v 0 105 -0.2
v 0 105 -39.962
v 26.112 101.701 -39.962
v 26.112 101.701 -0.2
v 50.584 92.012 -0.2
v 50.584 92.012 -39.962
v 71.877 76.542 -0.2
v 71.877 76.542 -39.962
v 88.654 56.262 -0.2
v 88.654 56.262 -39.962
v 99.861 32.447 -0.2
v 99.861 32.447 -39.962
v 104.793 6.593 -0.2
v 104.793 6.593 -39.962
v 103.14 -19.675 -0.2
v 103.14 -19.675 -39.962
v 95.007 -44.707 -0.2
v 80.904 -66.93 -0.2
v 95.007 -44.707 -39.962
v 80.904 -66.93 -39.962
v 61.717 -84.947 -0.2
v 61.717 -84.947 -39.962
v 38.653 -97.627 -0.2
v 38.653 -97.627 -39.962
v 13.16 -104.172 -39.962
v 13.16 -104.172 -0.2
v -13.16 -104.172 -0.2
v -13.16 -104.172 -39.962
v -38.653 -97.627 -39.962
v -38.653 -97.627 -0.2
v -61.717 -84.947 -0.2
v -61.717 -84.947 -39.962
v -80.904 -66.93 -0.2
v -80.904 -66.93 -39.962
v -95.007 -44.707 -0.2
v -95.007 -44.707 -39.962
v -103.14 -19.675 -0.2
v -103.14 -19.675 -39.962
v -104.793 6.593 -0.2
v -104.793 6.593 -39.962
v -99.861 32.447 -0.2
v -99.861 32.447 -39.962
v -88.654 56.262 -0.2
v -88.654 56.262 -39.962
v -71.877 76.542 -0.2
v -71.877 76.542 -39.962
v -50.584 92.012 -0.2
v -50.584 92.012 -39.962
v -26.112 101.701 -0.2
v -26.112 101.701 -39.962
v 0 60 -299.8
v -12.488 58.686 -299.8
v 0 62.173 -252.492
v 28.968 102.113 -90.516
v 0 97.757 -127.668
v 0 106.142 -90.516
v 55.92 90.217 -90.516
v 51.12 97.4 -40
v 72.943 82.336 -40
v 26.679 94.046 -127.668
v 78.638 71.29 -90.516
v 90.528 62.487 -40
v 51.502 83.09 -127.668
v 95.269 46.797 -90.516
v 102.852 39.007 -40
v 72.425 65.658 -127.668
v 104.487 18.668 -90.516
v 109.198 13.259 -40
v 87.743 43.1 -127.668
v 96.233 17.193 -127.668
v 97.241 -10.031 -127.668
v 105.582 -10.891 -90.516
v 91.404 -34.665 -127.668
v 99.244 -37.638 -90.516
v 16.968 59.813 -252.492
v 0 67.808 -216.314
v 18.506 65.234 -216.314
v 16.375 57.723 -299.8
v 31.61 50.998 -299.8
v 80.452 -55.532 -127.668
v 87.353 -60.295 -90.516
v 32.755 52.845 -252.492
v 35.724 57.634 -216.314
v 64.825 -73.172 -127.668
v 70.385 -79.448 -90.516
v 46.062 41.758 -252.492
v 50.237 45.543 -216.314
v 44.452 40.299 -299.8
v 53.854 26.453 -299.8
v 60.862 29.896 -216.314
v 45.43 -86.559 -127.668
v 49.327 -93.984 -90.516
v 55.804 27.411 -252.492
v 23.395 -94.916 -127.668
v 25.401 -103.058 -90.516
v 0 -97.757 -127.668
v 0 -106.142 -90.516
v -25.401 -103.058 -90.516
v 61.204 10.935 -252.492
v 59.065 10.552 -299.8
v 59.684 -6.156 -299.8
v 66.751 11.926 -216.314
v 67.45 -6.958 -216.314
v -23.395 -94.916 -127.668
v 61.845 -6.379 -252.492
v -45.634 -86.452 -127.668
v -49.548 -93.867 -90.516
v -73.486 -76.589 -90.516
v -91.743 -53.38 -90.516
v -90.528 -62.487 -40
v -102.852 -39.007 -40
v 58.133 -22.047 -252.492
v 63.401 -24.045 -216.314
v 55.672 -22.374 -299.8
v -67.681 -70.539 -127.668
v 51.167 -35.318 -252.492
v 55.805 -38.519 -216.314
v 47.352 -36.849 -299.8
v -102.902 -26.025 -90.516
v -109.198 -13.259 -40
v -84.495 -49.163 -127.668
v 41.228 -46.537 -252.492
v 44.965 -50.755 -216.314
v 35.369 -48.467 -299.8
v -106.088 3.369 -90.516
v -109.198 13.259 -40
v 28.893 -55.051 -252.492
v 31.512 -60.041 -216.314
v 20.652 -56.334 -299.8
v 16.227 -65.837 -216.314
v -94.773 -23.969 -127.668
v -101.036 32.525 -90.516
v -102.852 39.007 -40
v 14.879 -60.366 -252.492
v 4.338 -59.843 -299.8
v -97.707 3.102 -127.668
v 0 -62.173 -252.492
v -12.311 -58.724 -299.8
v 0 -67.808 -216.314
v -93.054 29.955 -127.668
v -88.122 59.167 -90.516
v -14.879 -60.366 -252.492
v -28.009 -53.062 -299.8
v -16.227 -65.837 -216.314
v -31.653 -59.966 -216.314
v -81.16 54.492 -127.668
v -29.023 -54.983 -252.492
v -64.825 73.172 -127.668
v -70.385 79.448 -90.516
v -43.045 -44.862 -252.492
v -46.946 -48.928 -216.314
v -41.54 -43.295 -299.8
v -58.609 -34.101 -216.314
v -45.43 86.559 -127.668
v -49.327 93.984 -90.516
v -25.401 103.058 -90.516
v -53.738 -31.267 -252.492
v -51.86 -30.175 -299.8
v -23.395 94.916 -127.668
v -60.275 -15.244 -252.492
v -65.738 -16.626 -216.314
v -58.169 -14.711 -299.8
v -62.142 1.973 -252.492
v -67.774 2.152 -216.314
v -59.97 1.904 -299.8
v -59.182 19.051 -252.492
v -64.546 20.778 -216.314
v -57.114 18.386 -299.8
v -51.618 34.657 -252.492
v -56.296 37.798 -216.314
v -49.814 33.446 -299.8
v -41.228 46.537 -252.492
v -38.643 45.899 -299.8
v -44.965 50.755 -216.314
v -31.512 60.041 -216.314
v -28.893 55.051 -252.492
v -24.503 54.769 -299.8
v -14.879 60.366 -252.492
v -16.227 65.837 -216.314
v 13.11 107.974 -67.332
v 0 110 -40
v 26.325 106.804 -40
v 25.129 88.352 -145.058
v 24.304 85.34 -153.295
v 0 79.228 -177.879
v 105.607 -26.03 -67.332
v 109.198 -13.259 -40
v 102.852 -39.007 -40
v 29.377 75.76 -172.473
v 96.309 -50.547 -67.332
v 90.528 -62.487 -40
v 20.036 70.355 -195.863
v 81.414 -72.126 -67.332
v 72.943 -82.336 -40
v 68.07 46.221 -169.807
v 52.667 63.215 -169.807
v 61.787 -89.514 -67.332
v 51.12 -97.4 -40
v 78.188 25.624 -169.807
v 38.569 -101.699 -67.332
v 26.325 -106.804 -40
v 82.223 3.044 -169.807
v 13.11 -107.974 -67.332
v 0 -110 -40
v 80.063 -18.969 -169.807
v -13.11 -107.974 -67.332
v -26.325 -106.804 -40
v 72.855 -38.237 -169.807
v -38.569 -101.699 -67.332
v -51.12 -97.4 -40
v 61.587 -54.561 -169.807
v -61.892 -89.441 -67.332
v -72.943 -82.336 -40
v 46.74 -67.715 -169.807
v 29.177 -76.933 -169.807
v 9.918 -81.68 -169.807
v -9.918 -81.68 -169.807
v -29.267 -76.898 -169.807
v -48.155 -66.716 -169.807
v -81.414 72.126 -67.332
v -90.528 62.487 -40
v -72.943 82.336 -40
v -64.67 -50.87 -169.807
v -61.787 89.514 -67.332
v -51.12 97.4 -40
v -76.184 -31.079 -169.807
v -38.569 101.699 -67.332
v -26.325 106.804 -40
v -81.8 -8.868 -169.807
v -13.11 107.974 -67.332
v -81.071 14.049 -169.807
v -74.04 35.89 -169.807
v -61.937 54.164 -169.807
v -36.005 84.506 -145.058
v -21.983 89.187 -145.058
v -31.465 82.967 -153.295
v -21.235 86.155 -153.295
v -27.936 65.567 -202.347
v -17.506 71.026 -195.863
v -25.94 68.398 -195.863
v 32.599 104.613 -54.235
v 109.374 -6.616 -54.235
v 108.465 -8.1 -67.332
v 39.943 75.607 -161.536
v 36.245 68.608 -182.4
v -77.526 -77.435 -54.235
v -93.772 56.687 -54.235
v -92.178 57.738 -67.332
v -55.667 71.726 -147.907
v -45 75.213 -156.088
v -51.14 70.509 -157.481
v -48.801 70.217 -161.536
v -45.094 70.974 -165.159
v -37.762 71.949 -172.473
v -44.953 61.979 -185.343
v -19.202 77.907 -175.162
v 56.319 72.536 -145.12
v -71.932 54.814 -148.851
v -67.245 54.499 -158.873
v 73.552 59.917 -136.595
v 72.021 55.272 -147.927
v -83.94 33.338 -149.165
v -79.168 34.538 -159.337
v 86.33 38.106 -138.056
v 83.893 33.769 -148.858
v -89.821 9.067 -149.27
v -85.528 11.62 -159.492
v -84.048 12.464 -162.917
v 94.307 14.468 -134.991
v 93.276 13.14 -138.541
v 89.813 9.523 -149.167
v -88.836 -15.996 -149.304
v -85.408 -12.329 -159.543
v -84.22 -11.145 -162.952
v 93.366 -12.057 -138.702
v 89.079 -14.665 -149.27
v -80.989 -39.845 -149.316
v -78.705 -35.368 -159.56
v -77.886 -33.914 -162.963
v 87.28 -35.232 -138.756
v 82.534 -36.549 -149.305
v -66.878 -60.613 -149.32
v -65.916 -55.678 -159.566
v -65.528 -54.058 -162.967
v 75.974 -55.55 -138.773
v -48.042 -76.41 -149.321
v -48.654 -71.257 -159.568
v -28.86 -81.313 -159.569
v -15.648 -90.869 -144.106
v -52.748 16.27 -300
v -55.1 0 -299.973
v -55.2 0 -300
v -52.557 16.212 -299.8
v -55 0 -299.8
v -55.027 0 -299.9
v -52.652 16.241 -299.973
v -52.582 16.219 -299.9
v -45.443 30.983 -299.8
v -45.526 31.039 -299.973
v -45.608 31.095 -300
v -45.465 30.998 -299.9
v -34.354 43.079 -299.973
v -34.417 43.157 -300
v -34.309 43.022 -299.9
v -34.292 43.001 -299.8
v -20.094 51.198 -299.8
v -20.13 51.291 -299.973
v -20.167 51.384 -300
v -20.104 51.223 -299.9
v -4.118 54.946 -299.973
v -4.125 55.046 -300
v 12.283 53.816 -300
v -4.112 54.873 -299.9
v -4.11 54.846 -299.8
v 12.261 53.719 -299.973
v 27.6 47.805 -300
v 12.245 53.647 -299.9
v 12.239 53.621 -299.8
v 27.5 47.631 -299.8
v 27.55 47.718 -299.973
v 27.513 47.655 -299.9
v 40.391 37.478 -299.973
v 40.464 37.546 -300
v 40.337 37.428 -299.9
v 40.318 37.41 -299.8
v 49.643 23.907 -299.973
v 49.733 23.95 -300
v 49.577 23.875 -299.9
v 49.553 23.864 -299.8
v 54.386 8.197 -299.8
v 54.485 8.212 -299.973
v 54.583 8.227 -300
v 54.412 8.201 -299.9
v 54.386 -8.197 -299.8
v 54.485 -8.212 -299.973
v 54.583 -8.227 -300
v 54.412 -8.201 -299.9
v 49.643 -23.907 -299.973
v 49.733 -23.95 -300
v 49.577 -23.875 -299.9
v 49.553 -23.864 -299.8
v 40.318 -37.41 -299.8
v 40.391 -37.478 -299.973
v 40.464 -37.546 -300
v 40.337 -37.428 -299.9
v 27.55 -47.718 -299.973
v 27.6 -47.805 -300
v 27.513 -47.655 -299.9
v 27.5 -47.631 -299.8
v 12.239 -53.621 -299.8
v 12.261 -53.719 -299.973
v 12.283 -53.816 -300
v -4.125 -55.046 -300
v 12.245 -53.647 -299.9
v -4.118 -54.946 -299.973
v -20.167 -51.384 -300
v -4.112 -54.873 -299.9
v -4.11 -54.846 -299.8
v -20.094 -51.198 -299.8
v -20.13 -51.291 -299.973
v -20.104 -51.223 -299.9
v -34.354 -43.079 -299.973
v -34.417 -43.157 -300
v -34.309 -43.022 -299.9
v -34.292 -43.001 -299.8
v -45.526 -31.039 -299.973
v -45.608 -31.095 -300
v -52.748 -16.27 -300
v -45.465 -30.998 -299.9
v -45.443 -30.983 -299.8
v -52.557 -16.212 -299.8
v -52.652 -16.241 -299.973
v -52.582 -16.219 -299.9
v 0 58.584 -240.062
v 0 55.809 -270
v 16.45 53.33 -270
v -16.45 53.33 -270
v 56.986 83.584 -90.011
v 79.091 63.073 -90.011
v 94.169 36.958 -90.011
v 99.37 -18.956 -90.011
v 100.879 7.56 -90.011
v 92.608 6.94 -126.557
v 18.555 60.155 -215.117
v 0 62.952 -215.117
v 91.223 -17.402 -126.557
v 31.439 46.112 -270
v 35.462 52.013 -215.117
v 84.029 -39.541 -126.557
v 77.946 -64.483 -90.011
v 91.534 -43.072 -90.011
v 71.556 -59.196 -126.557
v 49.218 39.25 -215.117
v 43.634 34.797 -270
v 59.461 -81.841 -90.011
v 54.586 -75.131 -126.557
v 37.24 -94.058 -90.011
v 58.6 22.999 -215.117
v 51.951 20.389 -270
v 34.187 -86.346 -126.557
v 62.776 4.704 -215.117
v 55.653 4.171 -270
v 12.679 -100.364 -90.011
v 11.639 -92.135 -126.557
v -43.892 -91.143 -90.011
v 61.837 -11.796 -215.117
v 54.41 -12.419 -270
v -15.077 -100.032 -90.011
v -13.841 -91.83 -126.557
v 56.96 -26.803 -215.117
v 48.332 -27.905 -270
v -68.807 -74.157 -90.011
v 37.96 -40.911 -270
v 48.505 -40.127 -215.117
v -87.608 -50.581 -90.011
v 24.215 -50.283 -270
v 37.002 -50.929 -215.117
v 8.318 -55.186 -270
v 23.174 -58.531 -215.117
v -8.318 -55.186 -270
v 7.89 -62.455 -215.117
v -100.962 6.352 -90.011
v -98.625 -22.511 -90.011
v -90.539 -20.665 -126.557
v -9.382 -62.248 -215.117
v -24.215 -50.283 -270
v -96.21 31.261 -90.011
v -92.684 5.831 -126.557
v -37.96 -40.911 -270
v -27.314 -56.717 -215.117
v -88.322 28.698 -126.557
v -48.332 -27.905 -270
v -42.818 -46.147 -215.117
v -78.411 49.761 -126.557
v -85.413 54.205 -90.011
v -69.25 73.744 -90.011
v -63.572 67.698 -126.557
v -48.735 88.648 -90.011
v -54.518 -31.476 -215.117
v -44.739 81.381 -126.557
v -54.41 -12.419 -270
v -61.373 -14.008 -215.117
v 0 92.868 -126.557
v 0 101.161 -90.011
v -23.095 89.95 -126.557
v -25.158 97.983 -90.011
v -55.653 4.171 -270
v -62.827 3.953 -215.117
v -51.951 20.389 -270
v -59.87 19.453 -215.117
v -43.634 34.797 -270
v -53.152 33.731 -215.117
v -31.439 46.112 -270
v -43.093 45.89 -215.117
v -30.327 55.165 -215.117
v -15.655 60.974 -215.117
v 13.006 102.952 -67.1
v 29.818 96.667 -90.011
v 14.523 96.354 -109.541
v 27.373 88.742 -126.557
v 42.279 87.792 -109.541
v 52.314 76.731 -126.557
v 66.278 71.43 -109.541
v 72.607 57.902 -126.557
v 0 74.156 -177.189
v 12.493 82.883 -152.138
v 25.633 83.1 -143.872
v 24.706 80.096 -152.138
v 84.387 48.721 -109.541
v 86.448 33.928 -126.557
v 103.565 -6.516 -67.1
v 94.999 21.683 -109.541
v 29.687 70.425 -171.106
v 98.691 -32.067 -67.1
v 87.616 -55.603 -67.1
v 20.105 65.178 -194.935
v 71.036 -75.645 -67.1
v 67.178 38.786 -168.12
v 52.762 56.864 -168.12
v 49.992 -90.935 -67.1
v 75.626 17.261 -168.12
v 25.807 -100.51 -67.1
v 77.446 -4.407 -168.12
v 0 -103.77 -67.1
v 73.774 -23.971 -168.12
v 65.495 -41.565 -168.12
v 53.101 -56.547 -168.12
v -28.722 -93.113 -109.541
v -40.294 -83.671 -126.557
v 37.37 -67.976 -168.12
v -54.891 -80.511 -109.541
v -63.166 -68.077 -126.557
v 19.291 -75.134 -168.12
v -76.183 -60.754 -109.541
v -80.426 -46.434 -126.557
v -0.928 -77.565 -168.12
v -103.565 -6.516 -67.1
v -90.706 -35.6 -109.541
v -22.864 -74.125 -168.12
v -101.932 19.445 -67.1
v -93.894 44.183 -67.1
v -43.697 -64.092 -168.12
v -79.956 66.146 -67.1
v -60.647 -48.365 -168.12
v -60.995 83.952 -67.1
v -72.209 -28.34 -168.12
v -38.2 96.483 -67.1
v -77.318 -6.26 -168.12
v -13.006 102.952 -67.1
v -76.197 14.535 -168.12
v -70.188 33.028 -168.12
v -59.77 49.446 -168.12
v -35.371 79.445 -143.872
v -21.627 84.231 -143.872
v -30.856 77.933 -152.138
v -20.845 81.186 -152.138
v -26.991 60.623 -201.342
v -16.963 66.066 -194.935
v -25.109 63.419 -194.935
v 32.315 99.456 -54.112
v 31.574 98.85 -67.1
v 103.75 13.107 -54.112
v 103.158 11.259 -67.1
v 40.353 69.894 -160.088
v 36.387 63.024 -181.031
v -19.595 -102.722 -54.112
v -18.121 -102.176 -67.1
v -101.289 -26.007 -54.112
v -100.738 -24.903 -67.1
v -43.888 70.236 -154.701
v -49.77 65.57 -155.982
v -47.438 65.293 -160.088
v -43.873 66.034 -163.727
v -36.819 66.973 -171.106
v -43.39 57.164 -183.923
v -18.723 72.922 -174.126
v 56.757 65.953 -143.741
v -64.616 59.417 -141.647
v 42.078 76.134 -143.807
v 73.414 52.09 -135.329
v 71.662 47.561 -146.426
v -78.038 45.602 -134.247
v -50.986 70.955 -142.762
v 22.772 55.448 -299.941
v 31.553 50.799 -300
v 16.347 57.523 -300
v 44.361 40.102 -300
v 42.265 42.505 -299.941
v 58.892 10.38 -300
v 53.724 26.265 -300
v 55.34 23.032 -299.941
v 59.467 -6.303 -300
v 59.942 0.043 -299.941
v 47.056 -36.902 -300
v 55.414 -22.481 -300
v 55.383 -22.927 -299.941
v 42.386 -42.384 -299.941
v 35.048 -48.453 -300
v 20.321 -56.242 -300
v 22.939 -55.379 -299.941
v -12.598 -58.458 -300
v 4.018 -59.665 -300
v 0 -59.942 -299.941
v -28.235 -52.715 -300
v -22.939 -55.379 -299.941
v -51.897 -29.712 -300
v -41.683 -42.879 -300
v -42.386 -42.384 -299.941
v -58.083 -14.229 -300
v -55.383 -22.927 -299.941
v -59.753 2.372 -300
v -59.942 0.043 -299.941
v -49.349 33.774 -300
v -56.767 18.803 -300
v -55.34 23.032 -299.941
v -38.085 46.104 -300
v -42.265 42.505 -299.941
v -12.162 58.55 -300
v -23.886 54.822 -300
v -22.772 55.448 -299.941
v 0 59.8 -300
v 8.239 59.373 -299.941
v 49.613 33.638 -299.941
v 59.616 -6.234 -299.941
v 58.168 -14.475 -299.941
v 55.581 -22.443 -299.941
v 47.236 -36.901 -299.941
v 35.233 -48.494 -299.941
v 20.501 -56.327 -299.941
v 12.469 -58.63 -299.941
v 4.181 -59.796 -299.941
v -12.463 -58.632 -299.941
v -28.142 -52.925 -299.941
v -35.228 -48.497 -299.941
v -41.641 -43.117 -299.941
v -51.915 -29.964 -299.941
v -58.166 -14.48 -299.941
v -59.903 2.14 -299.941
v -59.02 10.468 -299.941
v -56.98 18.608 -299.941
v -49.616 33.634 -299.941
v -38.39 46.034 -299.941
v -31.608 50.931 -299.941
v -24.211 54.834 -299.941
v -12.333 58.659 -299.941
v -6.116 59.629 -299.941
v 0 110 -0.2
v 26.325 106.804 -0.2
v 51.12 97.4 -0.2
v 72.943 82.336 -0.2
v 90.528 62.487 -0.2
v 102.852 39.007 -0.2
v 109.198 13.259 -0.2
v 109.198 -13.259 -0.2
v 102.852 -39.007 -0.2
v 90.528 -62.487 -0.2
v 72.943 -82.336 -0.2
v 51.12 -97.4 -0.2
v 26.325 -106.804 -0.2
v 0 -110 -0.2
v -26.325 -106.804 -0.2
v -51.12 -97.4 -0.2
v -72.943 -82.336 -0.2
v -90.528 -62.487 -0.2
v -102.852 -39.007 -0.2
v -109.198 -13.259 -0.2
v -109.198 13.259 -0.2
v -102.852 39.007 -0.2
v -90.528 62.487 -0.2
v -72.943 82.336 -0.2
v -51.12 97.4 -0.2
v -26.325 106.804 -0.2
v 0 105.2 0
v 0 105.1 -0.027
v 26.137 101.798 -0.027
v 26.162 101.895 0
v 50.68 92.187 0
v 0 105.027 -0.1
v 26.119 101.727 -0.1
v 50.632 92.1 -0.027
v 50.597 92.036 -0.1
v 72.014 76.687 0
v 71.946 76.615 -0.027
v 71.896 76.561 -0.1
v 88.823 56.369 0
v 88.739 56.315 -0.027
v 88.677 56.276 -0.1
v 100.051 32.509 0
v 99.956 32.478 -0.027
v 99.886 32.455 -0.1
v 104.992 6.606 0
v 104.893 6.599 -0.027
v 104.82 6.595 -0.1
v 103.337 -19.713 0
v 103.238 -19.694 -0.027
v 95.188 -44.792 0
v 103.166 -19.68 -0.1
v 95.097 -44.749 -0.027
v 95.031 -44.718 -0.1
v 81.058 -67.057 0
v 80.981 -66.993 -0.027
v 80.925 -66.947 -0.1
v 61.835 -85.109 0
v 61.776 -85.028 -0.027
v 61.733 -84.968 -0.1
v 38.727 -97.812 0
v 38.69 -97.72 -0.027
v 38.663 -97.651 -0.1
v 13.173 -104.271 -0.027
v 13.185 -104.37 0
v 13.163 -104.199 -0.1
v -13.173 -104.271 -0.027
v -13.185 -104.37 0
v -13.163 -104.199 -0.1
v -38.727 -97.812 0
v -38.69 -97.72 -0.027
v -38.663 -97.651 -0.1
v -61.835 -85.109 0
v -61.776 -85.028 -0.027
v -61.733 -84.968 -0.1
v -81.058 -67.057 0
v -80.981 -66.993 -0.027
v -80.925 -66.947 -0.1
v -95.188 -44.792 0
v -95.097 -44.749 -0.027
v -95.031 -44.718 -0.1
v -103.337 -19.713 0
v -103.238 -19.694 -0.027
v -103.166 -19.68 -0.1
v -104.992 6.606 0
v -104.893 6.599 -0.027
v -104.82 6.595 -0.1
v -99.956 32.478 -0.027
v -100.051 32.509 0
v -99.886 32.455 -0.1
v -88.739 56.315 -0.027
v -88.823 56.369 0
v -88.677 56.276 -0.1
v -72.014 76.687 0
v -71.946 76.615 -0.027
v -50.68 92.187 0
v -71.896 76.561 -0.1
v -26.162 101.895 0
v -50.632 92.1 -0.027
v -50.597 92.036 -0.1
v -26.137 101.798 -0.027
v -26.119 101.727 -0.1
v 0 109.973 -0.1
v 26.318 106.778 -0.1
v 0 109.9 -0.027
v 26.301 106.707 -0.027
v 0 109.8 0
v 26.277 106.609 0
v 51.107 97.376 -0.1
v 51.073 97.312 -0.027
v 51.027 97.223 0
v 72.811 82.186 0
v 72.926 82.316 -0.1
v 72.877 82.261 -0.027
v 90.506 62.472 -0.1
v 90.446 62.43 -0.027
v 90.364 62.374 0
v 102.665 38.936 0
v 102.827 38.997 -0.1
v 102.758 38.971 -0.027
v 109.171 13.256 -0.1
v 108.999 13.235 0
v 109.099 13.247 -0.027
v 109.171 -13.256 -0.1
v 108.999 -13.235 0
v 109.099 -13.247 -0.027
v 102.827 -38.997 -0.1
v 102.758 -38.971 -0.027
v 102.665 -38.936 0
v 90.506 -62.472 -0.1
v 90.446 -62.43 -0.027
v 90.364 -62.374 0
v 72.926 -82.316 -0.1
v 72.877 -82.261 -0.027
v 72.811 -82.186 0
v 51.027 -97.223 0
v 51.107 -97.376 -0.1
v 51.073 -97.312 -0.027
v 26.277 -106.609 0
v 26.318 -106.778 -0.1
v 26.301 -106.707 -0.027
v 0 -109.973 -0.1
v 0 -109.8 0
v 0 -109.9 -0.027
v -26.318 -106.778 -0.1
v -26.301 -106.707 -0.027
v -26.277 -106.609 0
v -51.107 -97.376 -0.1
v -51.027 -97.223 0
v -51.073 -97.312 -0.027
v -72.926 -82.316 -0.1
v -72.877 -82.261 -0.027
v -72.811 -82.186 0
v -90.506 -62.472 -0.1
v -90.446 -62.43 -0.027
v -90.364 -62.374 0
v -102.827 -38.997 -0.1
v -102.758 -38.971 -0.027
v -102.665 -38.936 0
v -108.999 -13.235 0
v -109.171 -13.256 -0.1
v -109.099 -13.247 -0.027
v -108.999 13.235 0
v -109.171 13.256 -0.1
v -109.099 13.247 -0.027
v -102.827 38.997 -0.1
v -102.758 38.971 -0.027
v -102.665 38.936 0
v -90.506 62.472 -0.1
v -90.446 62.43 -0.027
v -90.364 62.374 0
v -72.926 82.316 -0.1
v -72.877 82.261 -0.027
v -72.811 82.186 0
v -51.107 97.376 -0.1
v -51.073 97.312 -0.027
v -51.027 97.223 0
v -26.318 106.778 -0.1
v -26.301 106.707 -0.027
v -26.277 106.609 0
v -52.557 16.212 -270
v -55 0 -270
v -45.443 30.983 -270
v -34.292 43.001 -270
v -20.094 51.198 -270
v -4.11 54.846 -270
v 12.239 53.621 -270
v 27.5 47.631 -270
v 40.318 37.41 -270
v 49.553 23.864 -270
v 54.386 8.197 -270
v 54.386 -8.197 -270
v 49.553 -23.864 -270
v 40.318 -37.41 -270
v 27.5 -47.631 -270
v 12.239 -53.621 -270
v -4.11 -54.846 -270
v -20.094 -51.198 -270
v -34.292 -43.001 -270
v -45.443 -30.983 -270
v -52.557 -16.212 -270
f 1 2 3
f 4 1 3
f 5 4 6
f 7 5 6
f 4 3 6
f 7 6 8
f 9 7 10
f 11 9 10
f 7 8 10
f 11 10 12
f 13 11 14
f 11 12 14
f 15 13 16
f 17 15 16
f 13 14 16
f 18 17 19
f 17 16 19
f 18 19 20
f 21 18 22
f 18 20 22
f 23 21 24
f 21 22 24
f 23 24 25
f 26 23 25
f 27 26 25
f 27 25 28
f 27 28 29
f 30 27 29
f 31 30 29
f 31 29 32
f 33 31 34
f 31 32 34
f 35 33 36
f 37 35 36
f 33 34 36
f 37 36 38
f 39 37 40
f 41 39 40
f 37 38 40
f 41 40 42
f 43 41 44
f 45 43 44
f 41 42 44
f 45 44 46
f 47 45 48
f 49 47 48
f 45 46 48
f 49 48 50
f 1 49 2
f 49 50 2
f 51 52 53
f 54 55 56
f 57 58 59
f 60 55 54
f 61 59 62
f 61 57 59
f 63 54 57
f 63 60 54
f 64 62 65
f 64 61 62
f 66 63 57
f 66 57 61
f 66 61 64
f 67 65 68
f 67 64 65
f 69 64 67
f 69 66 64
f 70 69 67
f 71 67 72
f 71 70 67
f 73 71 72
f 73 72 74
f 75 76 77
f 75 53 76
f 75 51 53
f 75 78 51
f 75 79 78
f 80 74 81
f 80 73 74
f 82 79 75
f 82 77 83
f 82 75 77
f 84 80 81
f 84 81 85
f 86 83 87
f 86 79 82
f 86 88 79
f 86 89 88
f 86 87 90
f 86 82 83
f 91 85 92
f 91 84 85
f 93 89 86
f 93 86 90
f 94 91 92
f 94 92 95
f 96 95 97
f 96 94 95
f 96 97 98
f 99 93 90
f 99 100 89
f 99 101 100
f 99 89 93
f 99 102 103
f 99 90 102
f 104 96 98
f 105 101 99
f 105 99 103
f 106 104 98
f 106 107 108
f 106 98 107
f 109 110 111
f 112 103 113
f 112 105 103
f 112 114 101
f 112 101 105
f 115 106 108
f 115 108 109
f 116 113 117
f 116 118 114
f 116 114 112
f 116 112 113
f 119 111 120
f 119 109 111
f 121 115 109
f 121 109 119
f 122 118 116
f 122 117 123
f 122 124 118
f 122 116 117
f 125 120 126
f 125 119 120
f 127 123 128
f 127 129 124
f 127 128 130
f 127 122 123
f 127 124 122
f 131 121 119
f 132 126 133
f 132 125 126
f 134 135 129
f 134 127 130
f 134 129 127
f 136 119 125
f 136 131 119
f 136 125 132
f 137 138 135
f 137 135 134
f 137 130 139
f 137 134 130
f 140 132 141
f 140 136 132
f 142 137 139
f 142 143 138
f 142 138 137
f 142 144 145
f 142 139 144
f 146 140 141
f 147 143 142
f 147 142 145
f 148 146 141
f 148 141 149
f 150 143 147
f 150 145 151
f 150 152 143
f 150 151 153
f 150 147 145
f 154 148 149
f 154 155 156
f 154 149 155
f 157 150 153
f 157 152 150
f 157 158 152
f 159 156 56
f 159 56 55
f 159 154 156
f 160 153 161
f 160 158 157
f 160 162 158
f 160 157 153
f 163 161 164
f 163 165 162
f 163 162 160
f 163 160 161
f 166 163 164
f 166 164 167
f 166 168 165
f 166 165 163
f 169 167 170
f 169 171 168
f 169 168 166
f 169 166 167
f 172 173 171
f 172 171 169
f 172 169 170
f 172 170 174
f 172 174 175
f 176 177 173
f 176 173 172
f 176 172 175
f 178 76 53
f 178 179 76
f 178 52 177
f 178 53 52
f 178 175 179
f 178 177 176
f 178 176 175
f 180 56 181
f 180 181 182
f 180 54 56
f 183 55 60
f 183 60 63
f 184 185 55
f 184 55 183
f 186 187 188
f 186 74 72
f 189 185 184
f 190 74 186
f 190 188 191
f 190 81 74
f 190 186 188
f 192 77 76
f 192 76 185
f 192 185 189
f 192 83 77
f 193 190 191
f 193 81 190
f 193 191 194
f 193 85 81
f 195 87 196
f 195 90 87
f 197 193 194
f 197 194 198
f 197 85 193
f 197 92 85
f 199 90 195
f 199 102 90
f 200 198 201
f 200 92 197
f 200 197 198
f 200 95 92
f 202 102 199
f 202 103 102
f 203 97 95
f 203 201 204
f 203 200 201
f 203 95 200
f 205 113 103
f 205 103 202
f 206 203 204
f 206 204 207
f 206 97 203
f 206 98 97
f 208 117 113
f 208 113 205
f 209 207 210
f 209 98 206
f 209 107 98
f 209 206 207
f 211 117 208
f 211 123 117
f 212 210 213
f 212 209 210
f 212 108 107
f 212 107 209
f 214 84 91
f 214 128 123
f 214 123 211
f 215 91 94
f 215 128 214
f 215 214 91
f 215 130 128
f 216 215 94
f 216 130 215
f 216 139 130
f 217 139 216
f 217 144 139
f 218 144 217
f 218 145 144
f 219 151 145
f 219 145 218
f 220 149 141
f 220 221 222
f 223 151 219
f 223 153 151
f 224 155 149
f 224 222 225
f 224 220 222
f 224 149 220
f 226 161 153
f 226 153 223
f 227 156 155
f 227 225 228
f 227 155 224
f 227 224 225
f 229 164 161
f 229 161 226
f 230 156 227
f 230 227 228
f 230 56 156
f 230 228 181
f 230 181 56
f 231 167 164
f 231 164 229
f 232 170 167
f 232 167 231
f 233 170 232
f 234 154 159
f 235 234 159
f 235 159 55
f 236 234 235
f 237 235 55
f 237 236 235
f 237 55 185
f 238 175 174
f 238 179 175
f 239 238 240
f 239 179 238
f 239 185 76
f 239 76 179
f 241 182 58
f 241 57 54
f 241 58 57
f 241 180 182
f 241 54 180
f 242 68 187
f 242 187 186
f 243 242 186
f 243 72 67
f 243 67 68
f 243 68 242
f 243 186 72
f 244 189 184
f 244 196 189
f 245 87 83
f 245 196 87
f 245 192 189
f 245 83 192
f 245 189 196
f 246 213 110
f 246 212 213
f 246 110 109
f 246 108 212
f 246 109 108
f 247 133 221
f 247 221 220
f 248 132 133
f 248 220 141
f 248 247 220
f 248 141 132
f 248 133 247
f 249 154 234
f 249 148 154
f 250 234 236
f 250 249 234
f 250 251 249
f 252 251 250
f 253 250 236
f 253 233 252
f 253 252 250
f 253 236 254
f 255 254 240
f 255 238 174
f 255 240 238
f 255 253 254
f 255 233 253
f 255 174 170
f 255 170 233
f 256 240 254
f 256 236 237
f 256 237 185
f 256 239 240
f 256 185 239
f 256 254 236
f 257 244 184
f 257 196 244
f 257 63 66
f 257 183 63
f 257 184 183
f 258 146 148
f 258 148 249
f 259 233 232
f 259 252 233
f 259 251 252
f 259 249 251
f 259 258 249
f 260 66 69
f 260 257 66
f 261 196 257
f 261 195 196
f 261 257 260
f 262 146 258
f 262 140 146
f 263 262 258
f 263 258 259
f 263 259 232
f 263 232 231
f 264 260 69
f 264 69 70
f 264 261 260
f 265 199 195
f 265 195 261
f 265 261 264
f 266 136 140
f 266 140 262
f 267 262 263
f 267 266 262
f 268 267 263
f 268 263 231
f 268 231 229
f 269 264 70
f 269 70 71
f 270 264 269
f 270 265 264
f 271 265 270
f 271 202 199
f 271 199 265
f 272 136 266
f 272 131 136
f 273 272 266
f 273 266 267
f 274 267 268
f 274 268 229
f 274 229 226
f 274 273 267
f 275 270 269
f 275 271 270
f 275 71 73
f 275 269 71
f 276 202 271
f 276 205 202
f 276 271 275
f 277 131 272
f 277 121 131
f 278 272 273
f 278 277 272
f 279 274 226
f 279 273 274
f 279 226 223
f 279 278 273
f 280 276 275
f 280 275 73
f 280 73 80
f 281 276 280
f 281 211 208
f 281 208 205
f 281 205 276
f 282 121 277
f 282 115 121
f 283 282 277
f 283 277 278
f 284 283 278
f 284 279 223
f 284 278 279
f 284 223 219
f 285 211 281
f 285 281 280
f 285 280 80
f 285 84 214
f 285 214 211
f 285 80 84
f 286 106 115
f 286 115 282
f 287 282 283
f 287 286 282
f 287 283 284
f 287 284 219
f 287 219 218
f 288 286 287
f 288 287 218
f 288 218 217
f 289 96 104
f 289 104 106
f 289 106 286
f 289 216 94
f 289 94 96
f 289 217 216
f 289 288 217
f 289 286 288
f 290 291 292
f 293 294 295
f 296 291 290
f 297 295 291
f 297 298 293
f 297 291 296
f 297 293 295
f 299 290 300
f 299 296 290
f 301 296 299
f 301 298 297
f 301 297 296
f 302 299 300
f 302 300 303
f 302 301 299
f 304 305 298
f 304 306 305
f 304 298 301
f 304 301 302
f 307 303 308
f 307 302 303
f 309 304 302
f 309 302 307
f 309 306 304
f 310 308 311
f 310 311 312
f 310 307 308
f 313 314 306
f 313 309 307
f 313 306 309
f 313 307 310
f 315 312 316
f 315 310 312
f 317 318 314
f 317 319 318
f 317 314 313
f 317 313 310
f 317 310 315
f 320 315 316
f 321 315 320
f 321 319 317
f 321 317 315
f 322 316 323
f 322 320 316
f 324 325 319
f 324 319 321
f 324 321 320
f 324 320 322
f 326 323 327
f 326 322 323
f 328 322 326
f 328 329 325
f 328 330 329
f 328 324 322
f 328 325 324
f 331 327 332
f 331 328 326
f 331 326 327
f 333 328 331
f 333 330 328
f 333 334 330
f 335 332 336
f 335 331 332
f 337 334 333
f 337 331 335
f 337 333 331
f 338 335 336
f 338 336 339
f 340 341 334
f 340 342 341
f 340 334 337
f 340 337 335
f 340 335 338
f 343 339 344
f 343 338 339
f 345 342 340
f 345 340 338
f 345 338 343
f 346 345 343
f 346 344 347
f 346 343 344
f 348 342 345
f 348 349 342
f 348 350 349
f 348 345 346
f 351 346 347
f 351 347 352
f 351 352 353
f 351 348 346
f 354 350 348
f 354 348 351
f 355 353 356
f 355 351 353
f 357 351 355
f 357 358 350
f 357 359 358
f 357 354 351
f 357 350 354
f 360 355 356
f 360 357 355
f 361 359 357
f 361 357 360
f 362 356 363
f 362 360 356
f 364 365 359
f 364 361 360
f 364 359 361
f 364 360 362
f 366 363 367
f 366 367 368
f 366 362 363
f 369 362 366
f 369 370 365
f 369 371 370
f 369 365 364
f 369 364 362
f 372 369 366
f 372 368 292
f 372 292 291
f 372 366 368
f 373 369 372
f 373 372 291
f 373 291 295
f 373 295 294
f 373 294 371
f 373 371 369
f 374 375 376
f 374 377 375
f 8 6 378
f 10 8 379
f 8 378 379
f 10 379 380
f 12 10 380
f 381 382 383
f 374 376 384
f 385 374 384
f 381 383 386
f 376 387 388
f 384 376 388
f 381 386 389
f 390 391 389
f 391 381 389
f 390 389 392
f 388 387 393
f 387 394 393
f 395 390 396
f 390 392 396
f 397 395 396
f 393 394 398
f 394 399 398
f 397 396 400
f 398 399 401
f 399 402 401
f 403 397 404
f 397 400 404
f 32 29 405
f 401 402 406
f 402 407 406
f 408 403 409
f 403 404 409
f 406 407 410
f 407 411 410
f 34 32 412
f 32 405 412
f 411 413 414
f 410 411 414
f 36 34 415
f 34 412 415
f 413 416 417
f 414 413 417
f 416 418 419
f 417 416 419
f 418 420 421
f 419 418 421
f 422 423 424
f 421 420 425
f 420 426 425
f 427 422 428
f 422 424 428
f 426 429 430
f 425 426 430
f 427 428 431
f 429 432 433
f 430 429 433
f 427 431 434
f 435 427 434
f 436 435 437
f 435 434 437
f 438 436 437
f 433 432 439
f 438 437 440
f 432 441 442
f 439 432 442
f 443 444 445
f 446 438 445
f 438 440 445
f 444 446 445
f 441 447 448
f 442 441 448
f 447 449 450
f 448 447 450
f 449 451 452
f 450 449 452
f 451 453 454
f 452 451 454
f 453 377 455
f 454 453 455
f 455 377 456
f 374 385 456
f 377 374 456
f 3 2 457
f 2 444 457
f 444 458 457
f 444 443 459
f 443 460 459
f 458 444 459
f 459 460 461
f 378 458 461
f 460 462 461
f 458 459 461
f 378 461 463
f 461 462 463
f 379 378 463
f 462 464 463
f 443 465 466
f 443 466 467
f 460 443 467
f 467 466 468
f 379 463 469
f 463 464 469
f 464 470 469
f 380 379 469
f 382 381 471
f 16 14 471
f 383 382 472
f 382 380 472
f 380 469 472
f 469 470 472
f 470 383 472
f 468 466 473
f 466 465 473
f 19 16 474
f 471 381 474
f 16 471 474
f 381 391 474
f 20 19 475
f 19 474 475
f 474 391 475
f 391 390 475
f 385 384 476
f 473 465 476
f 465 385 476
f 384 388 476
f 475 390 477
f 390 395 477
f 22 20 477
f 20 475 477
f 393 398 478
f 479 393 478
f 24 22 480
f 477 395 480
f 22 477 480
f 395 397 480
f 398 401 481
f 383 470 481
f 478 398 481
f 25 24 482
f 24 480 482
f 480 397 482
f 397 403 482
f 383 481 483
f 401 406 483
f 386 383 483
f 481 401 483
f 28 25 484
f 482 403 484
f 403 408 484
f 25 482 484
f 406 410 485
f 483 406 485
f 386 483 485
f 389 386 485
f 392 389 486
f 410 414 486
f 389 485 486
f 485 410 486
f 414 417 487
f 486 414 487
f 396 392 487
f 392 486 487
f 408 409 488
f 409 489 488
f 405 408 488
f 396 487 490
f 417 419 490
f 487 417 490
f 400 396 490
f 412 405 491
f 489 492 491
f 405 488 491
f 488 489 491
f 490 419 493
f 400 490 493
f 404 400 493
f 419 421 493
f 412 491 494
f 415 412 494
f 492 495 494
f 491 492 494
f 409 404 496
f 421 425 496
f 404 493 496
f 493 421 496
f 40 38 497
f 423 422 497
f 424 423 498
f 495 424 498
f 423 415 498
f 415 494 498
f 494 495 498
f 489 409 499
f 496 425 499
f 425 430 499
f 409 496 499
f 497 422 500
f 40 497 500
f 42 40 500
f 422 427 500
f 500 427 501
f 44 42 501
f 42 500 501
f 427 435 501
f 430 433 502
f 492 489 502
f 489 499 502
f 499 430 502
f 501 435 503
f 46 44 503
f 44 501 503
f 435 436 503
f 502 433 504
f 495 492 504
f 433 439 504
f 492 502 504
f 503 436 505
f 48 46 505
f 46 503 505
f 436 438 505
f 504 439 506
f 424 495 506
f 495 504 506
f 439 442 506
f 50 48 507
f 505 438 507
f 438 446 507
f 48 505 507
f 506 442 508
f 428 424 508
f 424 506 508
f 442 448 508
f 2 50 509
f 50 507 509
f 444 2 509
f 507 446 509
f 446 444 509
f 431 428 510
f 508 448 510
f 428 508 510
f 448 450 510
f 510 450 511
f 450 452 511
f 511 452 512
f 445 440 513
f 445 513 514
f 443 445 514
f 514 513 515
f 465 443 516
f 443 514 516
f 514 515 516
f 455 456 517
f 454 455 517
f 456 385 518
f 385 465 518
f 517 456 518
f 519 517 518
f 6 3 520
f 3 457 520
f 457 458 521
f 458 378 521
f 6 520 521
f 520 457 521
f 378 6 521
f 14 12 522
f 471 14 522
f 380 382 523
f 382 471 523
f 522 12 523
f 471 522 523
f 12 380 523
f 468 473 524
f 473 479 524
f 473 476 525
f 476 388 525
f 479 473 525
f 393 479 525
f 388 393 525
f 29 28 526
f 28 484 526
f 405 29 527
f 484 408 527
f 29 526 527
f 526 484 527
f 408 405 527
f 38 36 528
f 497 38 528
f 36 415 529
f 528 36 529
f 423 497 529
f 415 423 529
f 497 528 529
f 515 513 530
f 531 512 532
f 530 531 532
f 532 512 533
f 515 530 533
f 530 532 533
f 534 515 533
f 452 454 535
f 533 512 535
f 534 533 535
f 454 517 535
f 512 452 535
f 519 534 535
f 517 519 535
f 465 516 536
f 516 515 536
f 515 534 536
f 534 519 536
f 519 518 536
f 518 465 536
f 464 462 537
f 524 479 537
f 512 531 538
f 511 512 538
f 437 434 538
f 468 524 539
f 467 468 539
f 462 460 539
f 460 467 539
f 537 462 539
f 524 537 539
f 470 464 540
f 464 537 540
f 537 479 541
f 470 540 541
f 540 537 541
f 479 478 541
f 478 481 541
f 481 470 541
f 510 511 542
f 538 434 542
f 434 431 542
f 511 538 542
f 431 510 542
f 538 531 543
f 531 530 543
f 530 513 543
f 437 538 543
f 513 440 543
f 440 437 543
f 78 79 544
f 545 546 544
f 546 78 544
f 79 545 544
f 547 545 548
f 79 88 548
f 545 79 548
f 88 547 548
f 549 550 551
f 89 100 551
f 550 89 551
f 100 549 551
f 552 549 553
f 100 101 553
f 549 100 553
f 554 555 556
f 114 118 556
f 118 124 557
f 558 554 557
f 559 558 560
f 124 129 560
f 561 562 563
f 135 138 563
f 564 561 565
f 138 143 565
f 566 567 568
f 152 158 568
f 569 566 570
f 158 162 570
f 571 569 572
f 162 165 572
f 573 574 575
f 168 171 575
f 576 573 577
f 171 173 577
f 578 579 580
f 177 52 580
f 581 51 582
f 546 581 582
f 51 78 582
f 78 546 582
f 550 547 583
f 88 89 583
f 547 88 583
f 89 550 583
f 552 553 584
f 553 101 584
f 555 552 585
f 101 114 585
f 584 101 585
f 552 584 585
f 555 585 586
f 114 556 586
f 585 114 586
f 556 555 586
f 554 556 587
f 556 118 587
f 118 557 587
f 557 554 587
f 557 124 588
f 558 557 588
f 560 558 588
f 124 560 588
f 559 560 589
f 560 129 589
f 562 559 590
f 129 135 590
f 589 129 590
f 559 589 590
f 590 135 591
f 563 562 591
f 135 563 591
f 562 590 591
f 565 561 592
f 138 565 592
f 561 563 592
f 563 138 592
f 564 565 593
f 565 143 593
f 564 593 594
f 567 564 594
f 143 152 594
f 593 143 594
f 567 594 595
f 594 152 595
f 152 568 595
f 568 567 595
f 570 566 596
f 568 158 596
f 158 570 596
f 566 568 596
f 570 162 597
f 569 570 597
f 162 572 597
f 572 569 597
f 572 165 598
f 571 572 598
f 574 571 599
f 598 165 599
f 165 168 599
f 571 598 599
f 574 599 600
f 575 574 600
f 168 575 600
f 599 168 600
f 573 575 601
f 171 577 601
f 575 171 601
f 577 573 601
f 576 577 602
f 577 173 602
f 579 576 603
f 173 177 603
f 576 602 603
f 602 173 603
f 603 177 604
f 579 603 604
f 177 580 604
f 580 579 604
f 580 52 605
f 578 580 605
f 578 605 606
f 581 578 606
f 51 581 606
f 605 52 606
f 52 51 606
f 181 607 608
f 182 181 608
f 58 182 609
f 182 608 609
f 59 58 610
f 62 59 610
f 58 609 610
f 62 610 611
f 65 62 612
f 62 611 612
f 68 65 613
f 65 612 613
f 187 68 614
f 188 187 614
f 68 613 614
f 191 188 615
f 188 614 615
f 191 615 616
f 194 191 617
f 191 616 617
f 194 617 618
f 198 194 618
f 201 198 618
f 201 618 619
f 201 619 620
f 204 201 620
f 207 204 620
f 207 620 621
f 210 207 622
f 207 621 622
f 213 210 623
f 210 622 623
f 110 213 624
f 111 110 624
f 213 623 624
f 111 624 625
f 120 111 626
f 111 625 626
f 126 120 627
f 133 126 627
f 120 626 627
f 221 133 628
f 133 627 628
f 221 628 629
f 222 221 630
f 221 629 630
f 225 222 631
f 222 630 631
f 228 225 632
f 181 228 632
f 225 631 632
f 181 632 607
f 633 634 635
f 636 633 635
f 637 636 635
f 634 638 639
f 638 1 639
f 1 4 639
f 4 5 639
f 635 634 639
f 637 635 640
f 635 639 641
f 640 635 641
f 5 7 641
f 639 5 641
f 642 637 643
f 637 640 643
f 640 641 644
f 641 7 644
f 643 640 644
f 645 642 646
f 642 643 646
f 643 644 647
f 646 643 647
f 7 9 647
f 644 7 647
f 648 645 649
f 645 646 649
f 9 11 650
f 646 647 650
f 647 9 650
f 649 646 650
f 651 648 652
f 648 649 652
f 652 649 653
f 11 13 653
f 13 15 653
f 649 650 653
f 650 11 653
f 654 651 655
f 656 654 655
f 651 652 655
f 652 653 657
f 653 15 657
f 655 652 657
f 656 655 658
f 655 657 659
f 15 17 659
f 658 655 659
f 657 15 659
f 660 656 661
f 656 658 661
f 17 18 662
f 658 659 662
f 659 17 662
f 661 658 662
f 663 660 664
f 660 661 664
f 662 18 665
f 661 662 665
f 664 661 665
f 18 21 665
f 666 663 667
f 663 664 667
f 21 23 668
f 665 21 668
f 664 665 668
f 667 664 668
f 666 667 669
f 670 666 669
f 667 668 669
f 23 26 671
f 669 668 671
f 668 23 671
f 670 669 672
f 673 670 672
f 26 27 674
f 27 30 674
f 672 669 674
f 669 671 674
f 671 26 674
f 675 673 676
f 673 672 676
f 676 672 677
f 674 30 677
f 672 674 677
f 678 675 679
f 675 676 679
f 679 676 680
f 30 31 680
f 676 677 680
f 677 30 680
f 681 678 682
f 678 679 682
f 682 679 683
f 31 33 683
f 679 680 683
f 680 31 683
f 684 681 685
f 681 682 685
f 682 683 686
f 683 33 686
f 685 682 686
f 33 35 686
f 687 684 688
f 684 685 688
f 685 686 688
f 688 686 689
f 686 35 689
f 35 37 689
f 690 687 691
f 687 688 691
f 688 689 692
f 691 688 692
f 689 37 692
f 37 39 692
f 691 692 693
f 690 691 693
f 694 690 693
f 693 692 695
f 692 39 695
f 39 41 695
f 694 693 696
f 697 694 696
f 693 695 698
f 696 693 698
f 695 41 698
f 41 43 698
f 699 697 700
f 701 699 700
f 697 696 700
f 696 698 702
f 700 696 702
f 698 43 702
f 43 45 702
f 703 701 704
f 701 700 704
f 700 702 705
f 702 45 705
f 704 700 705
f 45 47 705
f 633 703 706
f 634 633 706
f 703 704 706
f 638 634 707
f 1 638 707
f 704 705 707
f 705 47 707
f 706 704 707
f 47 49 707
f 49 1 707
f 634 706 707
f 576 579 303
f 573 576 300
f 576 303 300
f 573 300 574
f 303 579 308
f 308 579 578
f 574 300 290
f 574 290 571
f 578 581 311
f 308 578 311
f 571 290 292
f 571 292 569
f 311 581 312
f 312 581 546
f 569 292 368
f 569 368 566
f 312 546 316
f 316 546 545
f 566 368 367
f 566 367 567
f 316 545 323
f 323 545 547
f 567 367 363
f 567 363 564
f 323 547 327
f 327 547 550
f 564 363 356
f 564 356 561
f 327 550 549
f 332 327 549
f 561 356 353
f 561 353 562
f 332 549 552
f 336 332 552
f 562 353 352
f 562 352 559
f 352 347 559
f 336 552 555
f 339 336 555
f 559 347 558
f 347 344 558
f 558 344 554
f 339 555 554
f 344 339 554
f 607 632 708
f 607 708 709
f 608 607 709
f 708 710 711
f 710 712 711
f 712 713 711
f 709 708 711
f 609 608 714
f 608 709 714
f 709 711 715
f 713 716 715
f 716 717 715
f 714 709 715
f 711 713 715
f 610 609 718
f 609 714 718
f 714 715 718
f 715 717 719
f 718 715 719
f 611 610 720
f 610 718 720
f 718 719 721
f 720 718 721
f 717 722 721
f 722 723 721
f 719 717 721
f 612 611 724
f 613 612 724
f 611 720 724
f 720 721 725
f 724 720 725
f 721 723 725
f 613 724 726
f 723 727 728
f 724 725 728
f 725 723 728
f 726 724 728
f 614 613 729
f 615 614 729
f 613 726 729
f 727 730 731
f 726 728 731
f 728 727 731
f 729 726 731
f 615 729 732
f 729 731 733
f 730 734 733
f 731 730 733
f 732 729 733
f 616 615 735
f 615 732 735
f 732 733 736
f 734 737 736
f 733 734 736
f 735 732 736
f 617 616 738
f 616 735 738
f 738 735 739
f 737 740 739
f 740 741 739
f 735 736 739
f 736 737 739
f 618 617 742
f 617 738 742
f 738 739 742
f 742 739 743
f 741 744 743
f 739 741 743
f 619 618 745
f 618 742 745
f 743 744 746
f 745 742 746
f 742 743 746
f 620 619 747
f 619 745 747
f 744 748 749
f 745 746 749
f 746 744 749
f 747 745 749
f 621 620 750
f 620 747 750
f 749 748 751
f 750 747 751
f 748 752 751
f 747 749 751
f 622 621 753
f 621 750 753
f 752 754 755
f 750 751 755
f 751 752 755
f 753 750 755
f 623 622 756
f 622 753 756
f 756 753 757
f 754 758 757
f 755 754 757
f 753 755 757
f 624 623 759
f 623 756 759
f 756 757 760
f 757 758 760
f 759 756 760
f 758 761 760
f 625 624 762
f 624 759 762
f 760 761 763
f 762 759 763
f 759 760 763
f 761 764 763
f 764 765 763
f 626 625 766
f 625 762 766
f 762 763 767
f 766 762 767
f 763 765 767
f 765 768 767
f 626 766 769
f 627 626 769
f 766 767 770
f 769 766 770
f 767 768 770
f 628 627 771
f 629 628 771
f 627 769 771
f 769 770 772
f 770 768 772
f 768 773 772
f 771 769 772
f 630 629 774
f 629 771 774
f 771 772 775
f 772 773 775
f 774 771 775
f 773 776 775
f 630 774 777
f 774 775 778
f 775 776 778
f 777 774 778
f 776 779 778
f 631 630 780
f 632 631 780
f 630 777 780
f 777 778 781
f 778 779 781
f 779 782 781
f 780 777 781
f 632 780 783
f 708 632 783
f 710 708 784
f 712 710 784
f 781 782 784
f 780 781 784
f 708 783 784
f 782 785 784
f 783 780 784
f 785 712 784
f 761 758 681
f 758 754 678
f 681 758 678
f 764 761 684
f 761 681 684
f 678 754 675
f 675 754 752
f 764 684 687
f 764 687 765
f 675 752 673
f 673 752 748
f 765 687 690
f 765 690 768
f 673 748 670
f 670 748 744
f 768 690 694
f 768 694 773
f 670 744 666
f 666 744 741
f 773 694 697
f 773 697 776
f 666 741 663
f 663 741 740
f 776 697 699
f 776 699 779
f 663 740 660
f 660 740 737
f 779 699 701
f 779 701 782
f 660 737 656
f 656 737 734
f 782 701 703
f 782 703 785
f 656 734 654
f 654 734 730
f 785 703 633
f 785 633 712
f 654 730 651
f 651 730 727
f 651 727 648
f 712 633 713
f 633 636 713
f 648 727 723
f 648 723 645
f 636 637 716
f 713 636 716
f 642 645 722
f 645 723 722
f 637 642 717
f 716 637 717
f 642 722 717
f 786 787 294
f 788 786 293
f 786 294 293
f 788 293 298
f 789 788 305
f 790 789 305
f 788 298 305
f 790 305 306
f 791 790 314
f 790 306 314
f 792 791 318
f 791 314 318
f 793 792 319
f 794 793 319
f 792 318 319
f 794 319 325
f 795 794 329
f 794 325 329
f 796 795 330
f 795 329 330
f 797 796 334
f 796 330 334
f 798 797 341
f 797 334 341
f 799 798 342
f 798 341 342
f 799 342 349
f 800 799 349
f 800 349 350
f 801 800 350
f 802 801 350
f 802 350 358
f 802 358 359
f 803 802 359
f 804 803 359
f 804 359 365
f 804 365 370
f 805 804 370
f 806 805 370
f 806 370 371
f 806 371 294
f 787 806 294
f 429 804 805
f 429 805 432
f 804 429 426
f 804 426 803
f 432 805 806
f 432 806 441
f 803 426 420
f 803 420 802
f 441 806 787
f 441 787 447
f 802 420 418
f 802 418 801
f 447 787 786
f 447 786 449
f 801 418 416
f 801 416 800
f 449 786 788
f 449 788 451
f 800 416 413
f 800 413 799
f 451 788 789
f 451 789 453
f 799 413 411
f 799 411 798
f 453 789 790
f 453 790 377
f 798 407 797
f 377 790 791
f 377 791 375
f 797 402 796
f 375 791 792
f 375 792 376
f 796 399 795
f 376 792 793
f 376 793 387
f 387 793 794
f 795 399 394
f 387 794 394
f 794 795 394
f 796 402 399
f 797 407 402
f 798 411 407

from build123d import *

# Parameters (mm, degrees)
SKETCH3_R          = 55
CUT_EXTRUDE1_DEPTH = 301
FILLET1_R          = 0.2


with BuildPart() as part:
    # Sketch1 → Revolve1 (revolve)
    with BuildSketch(Plane(origin=(0, 0, 0), x_dir=(0, 0, -1), z_dir=(1, 0, 0))):
        Polygon((40, 110), (0, 110), (0, 105), (39.962075489, 105), (40, 105), align=None)
        with BuildLine():
            add(Edge.make_bspline(
                [(40, 110), (167.810260187, 108.065881674), (157.727730686, 60.110887647), (300, 60)],
                knots=[0, 0, 0, 0, 1, 1, 1, 1], degree=3))
            Line((40, 110), (40, 105))
            Line((40, 105), (39.962075489, 105))
            add(Edge.make_bspline(
                [(39.962075489, 105), (40.929960137, 104.985279631), (42.889640848, 104.94977384), (46.725264587, 104.857338815), (51.42229057, 104.700972371), (56.863552667, 104.451154588), (63.874803799, 104.038009353), (72.195159933, 103.377081586), (81.524927631, 102.370461384), (90.254463852, 101.167896472), (101.167419574, 99.32622961), (113.586002402, 96.620016504), (126.985333476, 92.855675215), (139.338719286, 88.695720496), (151.098628178, 84.257785223), (162.706347452, 79.664487009), (174.588858932, 75.050832351), (187.158880915, 70.565269184), (200.817492413, 66.363871547), (215.959791253, 62.601742323), (230.145053896, 59.956252343), (242.63508141, 58.203877587), (252.624857821, 57.088589246), (261.817748058, 56.313227436), (267.760458444, 55.935197653), (270, 55.809372848)],
                knots=[0.000100222, 0.000100222, 0.000100222, 0.000100222, 0.0078125, 0.015625, 0.03125, 0.046875, 0.0625, 0.09375, 0.125, 0.15625, 0.1875, 0.25, 0.3125, 0.375, 0.4375, 0.5, 0.5625, 0.625, 0.6875, 0.75, 0.8125, 0.84375, 0.875, 0.90625, 0.924568143, 0.924568143, 0.924568143, 0.924568143], degree=3))
            Line((270, 55.809372848), (270, 60))
            Line((270, 60), (300, 60))
        make_face()
        Polygon((300, 0), (300, 60), (270, 60), (270, 55.809372848), (270, 0), align=None)
    revolve(axis=Axis((0, 0, 0), (0, 0, -1)))

    # Sketch3 → Cut-Extrude1 (cut, through all)
    with BuildSketch(Plane(origin=(0, 0, -300), x_dir=(-1, 0, 0), z_dir=(0, 0, -1))):
        Circle(SKETCH3_R)
    extrude(amount=-CUT_EXTRUDE1_DEPTH, mode=Mode.SUBTRACT)

    # Fillet1
    fillet1_edges = [part.edges().sort_by_distance(p)[0] for p in [
        (55, 0, -300),
        (0, -105, 0),
        (0, -110, 0),
        (0, -60, -300),
    ]]
    fillet(fillet1_edges, radius=FILLET1_R)


solid = part.part
